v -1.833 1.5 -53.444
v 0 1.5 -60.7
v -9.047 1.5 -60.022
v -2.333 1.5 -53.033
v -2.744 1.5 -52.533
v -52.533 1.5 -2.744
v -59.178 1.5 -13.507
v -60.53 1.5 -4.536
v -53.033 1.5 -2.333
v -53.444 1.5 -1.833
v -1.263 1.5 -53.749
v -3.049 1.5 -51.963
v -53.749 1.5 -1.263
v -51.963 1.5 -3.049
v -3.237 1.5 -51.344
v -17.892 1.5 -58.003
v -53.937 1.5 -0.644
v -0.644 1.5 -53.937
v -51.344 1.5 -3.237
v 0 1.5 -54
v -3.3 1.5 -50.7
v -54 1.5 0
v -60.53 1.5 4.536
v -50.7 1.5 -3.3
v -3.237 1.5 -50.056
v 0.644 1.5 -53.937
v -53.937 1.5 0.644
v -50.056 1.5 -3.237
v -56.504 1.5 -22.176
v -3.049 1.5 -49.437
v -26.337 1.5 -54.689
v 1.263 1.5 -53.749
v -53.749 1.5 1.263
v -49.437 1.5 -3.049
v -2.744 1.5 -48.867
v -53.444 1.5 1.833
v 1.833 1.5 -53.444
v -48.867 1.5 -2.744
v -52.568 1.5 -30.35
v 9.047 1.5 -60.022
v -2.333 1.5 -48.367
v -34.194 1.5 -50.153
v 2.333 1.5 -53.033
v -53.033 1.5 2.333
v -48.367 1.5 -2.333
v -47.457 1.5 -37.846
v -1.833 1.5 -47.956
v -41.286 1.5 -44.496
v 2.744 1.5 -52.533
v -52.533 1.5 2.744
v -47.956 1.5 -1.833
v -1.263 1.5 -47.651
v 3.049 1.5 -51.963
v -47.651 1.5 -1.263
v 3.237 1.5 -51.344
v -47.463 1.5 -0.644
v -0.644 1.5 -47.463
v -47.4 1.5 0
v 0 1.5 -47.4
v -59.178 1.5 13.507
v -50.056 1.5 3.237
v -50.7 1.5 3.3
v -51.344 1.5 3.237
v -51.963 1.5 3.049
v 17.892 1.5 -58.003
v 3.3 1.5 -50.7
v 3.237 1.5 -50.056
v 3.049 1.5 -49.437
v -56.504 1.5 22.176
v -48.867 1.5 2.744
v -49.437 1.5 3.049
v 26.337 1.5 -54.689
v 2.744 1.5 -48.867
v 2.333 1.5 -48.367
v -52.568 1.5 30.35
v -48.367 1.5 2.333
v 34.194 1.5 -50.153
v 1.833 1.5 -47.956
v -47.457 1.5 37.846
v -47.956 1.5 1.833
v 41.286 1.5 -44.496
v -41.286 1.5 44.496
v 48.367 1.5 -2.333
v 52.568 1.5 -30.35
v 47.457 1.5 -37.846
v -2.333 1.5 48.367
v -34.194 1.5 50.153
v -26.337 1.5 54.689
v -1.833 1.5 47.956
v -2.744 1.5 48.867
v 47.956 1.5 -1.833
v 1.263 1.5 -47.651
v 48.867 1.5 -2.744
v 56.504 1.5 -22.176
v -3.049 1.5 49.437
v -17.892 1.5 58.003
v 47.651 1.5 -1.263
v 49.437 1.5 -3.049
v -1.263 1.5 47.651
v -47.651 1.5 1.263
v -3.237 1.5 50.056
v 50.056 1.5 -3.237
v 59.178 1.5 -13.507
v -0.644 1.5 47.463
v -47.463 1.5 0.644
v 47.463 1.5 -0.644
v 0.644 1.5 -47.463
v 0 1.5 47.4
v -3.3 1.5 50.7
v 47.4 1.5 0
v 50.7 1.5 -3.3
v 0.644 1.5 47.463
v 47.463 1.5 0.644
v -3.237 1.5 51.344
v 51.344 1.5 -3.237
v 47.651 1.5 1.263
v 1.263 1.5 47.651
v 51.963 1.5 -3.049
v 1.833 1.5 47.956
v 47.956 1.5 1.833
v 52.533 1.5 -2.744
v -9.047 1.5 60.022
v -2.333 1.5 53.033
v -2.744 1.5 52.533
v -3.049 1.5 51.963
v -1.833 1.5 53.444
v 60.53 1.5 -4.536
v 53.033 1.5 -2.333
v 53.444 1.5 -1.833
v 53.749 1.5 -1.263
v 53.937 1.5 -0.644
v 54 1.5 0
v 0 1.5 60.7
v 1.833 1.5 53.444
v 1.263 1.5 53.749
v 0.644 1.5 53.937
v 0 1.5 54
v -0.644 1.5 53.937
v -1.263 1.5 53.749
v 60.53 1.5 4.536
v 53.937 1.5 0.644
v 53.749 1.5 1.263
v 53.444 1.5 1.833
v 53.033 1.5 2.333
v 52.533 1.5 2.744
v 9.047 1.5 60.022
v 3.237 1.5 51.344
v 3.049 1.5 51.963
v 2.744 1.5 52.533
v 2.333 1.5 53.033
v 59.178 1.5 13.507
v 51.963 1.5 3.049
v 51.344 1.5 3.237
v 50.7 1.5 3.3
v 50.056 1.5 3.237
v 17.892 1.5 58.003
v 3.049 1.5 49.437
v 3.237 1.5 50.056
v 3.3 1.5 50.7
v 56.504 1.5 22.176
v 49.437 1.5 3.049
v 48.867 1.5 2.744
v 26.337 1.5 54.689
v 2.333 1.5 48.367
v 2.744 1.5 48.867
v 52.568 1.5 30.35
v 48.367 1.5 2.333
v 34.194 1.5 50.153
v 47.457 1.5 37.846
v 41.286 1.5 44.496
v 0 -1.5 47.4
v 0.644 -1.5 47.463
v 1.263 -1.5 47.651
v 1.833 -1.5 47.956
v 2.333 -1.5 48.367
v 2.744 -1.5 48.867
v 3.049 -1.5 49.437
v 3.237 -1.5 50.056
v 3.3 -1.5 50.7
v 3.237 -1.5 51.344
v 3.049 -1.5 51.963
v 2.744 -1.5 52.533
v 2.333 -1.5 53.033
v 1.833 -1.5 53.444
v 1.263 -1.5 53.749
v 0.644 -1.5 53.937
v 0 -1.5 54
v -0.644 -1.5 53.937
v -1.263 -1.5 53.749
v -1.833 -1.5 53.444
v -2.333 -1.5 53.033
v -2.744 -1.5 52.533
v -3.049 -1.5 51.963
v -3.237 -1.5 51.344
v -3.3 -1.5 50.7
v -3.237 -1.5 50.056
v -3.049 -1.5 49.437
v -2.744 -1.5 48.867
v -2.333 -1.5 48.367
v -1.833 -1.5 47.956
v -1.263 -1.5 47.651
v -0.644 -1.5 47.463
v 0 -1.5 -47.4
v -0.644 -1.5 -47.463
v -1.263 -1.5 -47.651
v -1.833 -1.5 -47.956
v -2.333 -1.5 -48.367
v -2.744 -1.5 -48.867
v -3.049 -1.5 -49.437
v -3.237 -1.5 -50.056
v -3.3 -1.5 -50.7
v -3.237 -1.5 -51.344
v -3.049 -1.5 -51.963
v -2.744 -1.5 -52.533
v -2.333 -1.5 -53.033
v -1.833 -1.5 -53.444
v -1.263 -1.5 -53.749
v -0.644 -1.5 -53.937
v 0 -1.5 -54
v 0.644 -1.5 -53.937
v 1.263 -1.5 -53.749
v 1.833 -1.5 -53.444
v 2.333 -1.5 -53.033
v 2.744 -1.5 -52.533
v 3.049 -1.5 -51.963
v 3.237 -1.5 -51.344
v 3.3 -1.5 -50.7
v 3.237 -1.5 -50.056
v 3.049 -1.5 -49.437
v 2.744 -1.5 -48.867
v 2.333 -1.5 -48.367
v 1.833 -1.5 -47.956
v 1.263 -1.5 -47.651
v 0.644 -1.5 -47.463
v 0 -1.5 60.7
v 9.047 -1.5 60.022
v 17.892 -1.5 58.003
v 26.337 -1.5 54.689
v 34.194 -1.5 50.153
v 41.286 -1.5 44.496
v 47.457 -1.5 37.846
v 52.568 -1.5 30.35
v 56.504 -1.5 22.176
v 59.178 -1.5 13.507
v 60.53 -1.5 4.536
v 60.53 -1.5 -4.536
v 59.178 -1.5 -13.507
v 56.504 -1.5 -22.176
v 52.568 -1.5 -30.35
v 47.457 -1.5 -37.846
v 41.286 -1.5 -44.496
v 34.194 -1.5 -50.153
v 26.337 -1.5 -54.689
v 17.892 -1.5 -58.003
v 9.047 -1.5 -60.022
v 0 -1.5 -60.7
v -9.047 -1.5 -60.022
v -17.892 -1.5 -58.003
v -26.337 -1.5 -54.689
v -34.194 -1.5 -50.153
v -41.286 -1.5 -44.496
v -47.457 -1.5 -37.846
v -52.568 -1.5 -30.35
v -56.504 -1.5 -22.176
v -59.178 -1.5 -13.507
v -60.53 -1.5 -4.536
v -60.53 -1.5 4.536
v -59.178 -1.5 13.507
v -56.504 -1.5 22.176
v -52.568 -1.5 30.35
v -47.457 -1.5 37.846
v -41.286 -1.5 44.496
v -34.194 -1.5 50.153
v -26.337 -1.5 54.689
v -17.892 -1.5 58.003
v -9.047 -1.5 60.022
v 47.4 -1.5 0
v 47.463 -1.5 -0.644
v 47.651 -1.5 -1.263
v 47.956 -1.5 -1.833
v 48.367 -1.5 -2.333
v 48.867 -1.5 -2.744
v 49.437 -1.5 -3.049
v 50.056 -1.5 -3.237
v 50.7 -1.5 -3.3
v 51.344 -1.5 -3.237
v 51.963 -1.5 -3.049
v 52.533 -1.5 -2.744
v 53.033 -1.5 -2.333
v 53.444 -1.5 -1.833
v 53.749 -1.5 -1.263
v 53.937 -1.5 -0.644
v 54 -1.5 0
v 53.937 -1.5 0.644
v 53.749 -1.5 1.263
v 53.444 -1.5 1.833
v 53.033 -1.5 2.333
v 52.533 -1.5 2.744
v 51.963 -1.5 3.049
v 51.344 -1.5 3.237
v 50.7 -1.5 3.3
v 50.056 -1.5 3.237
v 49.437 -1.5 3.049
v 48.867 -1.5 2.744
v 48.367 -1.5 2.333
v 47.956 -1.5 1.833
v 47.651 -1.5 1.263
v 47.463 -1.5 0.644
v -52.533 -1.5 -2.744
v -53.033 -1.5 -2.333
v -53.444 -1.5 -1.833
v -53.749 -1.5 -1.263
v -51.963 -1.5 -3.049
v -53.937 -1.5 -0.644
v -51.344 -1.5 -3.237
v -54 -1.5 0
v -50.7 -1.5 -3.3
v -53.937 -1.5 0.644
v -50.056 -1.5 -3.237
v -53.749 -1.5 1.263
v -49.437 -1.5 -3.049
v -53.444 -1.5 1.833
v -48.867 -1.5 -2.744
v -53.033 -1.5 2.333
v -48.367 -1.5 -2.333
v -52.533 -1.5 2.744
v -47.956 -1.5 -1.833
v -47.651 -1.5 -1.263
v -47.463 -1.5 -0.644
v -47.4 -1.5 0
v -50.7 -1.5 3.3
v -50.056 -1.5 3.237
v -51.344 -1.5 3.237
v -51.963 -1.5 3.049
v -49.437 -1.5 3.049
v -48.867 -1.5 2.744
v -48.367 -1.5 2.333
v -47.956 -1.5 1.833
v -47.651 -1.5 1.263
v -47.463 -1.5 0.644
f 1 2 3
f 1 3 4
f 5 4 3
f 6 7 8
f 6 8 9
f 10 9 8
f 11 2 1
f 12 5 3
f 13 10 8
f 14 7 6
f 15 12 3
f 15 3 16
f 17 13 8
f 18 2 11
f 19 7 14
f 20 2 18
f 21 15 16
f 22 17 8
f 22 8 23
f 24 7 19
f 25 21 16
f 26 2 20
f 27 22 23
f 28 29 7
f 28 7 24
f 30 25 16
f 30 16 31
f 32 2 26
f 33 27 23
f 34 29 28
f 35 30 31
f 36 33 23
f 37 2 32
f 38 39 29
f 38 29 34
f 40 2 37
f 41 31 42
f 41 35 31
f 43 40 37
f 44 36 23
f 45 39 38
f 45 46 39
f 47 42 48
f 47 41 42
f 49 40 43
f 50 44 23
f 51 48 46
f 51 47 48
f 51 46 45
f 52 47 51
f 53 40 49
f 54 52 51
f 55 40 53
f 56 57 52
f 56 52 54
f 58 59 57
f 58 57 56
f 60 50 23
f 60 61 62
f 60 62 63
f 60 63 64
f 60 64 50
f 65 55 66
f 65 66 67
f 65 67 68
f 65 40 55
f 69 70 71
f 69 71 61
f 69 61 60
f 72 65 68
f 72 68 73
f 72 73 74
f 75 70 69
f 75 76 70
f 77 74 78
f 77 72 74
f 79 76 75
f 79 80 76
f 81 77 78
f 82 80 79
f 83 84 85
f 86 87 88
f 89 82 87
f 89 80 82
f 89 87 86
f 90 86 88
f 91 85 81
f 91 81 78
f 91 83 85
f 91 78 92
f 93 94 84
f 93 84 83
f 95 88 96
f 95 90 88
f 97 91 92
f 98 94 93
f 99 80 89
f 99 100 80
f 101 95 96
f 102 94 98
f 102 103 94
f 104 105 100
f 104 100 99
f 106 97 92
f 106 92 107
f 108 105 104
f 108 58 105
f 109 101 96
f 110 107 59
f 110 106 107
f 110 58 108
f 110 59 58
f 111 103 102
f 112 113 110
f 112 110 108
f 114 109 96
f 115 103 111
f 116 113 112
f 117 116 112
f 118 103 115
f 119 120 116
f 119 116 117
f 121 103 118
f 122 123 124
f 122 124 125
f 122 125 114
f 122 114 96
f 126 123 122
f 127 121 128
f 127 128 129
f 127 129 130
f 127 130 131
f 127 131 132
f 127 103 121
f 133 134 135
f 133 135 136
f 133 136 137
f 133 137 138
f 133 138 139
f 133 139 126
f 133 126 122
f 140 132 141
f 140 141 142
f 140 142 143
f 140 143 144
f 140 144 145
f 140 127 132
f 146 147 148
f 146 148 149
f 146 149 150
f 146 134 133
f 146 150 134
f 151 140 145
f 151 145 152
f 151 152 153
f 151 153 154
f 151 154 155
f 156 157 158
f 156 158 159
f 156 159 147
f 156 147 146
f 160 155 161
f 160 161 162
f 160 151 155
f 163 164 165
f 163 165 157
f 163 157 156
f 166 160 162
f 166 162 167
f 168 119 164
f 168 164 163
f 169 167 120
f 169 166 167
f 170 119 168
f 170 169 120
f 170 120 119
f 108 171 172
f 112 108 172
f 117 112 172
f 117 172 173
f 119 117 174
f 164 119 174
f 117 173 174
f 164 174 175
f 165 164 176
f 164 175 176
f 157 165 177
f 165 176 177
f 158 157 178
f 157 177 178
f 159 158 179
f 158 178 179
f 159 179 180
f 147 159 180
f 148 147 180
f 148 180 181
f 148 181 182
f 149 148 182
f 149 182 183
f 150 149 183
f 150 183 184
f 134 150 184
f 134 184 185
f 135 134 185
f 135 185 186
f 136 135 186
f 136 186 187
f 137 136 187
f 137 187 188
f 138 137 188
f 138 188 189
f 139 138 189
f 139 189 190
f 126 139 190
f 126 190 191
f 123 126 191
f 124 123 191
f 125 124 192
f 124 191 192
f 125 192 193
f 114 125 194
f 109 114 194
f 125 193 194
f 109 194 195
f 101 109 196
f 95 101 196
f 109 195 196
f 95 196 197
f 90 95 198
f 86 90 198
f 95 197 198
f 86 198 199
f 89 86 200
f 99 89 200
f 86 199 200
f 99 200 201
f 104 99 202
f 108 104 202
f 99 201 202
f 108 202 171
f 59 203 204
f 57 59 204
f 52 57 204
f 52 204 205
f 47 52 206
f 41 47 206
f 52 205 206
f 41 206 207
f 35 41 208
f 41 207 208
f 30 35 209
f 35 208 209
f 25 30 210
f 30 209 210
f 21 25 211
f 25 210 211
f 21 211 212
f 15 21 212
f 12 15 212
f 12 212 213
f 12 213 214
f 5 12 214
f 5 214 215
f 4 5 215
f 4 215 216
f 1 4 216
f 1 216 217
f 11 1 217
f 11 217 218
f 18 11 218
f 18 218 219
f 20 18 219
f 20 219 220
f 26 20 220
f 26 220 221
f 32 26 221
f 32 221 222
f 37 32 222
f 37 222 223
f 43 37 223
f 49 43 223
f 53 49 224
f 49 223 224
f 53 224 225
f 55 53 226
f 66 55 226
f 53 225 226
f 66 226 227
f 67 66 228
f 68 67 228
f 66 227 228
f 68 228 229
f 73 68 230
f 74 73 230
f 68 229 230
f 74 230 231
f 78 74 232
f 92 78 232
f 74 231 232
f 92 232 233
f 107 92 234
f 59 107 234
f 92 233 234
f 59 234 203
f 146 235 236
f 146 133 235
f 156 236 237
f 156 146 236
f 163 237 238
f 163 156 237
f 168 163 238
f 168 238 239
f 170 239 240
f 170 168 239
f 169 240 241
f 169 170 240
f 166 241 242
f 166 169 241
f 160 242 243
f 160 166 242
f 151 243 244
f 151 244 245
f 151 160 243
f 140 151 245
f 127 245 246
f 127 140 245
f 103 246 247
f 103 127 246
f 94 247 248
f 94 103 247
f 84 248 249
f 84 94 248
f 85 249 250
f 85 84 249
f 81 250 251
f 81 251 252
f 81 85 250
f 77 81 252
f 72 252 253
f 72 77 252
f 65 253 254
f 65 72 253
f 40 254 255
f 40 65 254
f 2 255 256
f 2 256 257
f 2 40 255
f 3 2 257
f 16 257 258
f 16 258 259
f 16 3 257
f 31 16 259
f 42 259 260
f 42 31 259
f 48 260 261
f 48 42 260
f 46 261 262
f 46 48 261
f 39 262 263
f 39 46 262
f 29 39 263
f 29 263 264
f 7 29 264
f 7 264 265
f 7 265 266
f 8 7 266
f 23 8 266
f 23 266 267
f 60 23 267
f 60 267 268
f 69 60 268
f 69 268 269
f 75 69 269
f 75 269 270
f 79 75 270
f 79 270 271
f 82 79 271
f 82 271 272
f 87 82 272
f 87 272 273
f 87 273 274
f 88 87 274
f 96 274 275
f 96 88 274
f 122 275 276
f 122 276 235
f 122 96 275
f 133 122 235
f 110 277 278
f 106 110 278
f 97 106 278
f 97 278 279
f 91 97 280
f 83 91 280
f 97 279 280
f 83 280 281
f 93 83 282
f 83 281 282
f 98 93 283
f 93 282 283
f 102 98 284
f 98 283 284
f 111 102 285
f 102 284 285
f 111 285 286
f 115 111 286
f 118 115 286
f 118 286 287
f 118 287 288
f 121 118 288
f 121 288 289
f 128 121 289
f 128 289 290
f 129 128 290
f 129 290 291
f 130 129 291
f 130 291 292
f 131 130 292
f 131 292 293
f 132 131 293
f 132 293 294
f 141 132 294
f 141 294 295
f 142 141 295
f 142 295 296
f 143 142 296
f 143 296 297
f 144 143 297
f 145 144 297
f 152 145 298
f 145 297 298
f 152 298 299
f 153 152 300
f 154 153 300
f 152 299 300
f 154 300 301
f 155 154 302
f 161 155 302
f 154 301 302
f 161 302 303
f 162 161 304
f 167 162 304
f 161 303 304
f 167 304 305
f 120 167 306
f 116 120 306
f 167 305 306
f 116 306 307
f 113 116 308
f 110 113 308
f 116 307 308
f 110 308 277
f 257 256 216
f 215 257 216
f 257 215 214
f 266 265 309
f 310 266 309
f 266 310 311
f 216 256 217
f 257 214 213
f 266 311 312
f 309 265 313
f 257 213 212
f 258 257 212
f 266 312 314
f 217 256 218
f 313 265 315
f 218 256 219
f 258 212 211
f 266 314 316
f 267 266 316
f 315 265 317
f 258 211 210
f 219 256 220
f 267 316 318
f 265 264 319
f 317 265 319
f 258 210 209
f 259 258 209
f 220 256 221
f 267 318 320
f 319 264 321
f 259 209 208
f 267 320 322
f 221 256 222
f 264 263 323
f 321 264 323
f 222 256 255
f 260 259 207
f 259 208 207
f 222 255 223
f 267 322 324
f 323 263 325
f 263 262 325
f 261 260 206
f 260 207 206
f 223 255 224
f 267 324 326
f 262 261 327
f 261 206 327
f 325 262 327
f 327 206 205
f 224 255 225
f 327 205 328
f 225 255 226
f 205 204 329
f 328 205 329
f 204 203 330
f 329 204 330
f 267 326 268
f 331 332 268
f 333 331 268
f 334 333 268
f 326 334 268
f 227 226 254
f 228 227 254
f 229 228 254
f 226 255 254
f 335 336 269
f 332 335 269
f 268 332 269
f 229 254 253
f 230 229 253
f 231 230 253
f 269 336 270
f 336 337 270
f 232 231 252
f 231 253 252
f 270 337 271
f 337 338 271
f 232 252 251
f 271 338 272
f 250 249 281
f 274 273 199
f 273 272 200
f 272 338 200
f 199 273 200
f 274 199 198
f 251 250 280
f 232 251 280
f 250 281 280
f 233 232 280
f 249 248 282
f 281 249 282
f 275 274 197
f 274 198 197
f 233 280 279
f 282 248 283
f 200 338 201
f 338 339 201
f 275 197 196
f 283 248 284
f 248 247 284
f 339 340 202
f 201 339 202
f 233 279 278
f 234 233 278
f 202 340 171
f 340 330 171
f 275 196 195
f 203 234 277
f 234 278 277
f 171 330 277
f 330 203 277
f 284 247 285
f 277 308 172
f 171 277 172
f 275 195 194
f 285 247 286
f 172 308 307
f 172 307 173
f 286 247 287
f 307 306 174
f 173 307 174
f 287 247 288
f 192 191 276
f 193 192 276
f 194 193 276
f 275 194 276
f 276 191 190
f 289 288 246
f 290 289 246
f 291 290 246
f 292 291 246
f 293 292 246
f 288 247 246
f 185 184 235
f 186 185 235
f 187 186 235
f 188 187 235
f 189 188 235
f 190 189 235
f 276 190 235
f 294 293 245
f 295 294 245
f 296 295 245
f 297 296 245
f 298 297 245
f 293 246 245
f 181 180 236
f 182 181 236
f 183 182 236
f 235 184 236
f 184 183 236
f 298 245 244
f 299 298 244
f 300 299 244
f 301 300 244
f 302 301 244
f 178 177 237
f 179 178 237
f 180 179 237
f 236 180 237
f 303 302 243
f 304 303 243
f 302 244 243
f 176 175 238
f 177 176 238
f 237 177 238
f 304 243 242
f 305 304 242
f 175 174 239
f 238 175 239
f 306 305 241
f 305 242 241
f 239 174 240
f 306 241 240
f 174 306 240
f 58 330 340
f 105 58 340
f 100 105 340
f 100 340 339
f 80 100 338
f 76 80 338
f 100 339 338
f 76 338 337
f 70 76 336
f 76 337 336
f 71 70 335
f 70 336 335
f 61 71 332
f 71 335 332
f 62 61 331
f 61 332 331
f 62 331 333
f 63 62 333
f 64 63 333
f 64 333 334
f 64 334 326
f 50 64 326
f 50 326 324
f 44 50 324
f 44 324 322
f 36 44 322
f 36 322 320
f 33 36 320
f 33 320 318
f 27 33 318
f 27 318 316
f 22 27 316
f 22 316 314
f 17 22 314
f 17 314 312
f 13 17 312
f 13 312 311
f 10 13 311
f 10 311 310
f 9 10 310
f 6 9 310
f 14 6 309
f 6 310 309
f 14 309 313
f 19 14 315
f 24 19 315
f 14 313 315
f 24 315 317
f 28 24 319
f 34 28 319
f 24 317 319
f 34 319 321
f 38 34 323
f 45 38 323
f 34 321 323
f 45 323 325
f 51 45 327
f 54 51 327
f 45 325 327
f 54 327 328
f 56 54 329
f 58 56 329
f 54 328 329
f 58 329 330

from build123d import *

# Parameters (mm, degrees)
SKETCH1_R            = 60.7
BOSS_EXTRUDE1_DEPTH  = 1.5
M6_CLEARANCE_HOLE1_D = 6.6
CIRPATTERN2_COUNT    = 4


with BuildPart() as part:
    # Sketch1 → Boss-Extrude1 (new, symmetric)
    with BuildSketch(Plane(origin=(0, 0, 0), x_dir=(1, 0, 0), z_dir=(0, 1, 0))):
        with Locations(Location((0, 0, 0), (0, 0, 270))):
            Circle(SKETCH1_R)
    extrude(amount=BOSS_EXTRUDE1_DEPTH, both=True)

    # M6 Clearance Hole1 (through all)
    with Locations(Plane(origin=(0, 1.5, 0), x_dir=(1, 0, 0), z_dir=(0, 1, 0))):
        with Locations((50.7, 0)):
            m6_clearance_hole1 = Hole(M6_CLEARANCE_HOLE1_D / 2)

    # CirPattern2: M6 Clearance Hole1 ×4 about axis
    cirpattern2_axis = Axis((0, 0, 0), (0, 1, 0))
    for i in range(1, CIRPATTERN2_COUNT):
        add(m6_clearance_hole1.rotate(cirpattern2_axis, i * 360 / CIRPATTERN2_COUNT), mode=Mode.SUBTRACT)


solid = part.part
